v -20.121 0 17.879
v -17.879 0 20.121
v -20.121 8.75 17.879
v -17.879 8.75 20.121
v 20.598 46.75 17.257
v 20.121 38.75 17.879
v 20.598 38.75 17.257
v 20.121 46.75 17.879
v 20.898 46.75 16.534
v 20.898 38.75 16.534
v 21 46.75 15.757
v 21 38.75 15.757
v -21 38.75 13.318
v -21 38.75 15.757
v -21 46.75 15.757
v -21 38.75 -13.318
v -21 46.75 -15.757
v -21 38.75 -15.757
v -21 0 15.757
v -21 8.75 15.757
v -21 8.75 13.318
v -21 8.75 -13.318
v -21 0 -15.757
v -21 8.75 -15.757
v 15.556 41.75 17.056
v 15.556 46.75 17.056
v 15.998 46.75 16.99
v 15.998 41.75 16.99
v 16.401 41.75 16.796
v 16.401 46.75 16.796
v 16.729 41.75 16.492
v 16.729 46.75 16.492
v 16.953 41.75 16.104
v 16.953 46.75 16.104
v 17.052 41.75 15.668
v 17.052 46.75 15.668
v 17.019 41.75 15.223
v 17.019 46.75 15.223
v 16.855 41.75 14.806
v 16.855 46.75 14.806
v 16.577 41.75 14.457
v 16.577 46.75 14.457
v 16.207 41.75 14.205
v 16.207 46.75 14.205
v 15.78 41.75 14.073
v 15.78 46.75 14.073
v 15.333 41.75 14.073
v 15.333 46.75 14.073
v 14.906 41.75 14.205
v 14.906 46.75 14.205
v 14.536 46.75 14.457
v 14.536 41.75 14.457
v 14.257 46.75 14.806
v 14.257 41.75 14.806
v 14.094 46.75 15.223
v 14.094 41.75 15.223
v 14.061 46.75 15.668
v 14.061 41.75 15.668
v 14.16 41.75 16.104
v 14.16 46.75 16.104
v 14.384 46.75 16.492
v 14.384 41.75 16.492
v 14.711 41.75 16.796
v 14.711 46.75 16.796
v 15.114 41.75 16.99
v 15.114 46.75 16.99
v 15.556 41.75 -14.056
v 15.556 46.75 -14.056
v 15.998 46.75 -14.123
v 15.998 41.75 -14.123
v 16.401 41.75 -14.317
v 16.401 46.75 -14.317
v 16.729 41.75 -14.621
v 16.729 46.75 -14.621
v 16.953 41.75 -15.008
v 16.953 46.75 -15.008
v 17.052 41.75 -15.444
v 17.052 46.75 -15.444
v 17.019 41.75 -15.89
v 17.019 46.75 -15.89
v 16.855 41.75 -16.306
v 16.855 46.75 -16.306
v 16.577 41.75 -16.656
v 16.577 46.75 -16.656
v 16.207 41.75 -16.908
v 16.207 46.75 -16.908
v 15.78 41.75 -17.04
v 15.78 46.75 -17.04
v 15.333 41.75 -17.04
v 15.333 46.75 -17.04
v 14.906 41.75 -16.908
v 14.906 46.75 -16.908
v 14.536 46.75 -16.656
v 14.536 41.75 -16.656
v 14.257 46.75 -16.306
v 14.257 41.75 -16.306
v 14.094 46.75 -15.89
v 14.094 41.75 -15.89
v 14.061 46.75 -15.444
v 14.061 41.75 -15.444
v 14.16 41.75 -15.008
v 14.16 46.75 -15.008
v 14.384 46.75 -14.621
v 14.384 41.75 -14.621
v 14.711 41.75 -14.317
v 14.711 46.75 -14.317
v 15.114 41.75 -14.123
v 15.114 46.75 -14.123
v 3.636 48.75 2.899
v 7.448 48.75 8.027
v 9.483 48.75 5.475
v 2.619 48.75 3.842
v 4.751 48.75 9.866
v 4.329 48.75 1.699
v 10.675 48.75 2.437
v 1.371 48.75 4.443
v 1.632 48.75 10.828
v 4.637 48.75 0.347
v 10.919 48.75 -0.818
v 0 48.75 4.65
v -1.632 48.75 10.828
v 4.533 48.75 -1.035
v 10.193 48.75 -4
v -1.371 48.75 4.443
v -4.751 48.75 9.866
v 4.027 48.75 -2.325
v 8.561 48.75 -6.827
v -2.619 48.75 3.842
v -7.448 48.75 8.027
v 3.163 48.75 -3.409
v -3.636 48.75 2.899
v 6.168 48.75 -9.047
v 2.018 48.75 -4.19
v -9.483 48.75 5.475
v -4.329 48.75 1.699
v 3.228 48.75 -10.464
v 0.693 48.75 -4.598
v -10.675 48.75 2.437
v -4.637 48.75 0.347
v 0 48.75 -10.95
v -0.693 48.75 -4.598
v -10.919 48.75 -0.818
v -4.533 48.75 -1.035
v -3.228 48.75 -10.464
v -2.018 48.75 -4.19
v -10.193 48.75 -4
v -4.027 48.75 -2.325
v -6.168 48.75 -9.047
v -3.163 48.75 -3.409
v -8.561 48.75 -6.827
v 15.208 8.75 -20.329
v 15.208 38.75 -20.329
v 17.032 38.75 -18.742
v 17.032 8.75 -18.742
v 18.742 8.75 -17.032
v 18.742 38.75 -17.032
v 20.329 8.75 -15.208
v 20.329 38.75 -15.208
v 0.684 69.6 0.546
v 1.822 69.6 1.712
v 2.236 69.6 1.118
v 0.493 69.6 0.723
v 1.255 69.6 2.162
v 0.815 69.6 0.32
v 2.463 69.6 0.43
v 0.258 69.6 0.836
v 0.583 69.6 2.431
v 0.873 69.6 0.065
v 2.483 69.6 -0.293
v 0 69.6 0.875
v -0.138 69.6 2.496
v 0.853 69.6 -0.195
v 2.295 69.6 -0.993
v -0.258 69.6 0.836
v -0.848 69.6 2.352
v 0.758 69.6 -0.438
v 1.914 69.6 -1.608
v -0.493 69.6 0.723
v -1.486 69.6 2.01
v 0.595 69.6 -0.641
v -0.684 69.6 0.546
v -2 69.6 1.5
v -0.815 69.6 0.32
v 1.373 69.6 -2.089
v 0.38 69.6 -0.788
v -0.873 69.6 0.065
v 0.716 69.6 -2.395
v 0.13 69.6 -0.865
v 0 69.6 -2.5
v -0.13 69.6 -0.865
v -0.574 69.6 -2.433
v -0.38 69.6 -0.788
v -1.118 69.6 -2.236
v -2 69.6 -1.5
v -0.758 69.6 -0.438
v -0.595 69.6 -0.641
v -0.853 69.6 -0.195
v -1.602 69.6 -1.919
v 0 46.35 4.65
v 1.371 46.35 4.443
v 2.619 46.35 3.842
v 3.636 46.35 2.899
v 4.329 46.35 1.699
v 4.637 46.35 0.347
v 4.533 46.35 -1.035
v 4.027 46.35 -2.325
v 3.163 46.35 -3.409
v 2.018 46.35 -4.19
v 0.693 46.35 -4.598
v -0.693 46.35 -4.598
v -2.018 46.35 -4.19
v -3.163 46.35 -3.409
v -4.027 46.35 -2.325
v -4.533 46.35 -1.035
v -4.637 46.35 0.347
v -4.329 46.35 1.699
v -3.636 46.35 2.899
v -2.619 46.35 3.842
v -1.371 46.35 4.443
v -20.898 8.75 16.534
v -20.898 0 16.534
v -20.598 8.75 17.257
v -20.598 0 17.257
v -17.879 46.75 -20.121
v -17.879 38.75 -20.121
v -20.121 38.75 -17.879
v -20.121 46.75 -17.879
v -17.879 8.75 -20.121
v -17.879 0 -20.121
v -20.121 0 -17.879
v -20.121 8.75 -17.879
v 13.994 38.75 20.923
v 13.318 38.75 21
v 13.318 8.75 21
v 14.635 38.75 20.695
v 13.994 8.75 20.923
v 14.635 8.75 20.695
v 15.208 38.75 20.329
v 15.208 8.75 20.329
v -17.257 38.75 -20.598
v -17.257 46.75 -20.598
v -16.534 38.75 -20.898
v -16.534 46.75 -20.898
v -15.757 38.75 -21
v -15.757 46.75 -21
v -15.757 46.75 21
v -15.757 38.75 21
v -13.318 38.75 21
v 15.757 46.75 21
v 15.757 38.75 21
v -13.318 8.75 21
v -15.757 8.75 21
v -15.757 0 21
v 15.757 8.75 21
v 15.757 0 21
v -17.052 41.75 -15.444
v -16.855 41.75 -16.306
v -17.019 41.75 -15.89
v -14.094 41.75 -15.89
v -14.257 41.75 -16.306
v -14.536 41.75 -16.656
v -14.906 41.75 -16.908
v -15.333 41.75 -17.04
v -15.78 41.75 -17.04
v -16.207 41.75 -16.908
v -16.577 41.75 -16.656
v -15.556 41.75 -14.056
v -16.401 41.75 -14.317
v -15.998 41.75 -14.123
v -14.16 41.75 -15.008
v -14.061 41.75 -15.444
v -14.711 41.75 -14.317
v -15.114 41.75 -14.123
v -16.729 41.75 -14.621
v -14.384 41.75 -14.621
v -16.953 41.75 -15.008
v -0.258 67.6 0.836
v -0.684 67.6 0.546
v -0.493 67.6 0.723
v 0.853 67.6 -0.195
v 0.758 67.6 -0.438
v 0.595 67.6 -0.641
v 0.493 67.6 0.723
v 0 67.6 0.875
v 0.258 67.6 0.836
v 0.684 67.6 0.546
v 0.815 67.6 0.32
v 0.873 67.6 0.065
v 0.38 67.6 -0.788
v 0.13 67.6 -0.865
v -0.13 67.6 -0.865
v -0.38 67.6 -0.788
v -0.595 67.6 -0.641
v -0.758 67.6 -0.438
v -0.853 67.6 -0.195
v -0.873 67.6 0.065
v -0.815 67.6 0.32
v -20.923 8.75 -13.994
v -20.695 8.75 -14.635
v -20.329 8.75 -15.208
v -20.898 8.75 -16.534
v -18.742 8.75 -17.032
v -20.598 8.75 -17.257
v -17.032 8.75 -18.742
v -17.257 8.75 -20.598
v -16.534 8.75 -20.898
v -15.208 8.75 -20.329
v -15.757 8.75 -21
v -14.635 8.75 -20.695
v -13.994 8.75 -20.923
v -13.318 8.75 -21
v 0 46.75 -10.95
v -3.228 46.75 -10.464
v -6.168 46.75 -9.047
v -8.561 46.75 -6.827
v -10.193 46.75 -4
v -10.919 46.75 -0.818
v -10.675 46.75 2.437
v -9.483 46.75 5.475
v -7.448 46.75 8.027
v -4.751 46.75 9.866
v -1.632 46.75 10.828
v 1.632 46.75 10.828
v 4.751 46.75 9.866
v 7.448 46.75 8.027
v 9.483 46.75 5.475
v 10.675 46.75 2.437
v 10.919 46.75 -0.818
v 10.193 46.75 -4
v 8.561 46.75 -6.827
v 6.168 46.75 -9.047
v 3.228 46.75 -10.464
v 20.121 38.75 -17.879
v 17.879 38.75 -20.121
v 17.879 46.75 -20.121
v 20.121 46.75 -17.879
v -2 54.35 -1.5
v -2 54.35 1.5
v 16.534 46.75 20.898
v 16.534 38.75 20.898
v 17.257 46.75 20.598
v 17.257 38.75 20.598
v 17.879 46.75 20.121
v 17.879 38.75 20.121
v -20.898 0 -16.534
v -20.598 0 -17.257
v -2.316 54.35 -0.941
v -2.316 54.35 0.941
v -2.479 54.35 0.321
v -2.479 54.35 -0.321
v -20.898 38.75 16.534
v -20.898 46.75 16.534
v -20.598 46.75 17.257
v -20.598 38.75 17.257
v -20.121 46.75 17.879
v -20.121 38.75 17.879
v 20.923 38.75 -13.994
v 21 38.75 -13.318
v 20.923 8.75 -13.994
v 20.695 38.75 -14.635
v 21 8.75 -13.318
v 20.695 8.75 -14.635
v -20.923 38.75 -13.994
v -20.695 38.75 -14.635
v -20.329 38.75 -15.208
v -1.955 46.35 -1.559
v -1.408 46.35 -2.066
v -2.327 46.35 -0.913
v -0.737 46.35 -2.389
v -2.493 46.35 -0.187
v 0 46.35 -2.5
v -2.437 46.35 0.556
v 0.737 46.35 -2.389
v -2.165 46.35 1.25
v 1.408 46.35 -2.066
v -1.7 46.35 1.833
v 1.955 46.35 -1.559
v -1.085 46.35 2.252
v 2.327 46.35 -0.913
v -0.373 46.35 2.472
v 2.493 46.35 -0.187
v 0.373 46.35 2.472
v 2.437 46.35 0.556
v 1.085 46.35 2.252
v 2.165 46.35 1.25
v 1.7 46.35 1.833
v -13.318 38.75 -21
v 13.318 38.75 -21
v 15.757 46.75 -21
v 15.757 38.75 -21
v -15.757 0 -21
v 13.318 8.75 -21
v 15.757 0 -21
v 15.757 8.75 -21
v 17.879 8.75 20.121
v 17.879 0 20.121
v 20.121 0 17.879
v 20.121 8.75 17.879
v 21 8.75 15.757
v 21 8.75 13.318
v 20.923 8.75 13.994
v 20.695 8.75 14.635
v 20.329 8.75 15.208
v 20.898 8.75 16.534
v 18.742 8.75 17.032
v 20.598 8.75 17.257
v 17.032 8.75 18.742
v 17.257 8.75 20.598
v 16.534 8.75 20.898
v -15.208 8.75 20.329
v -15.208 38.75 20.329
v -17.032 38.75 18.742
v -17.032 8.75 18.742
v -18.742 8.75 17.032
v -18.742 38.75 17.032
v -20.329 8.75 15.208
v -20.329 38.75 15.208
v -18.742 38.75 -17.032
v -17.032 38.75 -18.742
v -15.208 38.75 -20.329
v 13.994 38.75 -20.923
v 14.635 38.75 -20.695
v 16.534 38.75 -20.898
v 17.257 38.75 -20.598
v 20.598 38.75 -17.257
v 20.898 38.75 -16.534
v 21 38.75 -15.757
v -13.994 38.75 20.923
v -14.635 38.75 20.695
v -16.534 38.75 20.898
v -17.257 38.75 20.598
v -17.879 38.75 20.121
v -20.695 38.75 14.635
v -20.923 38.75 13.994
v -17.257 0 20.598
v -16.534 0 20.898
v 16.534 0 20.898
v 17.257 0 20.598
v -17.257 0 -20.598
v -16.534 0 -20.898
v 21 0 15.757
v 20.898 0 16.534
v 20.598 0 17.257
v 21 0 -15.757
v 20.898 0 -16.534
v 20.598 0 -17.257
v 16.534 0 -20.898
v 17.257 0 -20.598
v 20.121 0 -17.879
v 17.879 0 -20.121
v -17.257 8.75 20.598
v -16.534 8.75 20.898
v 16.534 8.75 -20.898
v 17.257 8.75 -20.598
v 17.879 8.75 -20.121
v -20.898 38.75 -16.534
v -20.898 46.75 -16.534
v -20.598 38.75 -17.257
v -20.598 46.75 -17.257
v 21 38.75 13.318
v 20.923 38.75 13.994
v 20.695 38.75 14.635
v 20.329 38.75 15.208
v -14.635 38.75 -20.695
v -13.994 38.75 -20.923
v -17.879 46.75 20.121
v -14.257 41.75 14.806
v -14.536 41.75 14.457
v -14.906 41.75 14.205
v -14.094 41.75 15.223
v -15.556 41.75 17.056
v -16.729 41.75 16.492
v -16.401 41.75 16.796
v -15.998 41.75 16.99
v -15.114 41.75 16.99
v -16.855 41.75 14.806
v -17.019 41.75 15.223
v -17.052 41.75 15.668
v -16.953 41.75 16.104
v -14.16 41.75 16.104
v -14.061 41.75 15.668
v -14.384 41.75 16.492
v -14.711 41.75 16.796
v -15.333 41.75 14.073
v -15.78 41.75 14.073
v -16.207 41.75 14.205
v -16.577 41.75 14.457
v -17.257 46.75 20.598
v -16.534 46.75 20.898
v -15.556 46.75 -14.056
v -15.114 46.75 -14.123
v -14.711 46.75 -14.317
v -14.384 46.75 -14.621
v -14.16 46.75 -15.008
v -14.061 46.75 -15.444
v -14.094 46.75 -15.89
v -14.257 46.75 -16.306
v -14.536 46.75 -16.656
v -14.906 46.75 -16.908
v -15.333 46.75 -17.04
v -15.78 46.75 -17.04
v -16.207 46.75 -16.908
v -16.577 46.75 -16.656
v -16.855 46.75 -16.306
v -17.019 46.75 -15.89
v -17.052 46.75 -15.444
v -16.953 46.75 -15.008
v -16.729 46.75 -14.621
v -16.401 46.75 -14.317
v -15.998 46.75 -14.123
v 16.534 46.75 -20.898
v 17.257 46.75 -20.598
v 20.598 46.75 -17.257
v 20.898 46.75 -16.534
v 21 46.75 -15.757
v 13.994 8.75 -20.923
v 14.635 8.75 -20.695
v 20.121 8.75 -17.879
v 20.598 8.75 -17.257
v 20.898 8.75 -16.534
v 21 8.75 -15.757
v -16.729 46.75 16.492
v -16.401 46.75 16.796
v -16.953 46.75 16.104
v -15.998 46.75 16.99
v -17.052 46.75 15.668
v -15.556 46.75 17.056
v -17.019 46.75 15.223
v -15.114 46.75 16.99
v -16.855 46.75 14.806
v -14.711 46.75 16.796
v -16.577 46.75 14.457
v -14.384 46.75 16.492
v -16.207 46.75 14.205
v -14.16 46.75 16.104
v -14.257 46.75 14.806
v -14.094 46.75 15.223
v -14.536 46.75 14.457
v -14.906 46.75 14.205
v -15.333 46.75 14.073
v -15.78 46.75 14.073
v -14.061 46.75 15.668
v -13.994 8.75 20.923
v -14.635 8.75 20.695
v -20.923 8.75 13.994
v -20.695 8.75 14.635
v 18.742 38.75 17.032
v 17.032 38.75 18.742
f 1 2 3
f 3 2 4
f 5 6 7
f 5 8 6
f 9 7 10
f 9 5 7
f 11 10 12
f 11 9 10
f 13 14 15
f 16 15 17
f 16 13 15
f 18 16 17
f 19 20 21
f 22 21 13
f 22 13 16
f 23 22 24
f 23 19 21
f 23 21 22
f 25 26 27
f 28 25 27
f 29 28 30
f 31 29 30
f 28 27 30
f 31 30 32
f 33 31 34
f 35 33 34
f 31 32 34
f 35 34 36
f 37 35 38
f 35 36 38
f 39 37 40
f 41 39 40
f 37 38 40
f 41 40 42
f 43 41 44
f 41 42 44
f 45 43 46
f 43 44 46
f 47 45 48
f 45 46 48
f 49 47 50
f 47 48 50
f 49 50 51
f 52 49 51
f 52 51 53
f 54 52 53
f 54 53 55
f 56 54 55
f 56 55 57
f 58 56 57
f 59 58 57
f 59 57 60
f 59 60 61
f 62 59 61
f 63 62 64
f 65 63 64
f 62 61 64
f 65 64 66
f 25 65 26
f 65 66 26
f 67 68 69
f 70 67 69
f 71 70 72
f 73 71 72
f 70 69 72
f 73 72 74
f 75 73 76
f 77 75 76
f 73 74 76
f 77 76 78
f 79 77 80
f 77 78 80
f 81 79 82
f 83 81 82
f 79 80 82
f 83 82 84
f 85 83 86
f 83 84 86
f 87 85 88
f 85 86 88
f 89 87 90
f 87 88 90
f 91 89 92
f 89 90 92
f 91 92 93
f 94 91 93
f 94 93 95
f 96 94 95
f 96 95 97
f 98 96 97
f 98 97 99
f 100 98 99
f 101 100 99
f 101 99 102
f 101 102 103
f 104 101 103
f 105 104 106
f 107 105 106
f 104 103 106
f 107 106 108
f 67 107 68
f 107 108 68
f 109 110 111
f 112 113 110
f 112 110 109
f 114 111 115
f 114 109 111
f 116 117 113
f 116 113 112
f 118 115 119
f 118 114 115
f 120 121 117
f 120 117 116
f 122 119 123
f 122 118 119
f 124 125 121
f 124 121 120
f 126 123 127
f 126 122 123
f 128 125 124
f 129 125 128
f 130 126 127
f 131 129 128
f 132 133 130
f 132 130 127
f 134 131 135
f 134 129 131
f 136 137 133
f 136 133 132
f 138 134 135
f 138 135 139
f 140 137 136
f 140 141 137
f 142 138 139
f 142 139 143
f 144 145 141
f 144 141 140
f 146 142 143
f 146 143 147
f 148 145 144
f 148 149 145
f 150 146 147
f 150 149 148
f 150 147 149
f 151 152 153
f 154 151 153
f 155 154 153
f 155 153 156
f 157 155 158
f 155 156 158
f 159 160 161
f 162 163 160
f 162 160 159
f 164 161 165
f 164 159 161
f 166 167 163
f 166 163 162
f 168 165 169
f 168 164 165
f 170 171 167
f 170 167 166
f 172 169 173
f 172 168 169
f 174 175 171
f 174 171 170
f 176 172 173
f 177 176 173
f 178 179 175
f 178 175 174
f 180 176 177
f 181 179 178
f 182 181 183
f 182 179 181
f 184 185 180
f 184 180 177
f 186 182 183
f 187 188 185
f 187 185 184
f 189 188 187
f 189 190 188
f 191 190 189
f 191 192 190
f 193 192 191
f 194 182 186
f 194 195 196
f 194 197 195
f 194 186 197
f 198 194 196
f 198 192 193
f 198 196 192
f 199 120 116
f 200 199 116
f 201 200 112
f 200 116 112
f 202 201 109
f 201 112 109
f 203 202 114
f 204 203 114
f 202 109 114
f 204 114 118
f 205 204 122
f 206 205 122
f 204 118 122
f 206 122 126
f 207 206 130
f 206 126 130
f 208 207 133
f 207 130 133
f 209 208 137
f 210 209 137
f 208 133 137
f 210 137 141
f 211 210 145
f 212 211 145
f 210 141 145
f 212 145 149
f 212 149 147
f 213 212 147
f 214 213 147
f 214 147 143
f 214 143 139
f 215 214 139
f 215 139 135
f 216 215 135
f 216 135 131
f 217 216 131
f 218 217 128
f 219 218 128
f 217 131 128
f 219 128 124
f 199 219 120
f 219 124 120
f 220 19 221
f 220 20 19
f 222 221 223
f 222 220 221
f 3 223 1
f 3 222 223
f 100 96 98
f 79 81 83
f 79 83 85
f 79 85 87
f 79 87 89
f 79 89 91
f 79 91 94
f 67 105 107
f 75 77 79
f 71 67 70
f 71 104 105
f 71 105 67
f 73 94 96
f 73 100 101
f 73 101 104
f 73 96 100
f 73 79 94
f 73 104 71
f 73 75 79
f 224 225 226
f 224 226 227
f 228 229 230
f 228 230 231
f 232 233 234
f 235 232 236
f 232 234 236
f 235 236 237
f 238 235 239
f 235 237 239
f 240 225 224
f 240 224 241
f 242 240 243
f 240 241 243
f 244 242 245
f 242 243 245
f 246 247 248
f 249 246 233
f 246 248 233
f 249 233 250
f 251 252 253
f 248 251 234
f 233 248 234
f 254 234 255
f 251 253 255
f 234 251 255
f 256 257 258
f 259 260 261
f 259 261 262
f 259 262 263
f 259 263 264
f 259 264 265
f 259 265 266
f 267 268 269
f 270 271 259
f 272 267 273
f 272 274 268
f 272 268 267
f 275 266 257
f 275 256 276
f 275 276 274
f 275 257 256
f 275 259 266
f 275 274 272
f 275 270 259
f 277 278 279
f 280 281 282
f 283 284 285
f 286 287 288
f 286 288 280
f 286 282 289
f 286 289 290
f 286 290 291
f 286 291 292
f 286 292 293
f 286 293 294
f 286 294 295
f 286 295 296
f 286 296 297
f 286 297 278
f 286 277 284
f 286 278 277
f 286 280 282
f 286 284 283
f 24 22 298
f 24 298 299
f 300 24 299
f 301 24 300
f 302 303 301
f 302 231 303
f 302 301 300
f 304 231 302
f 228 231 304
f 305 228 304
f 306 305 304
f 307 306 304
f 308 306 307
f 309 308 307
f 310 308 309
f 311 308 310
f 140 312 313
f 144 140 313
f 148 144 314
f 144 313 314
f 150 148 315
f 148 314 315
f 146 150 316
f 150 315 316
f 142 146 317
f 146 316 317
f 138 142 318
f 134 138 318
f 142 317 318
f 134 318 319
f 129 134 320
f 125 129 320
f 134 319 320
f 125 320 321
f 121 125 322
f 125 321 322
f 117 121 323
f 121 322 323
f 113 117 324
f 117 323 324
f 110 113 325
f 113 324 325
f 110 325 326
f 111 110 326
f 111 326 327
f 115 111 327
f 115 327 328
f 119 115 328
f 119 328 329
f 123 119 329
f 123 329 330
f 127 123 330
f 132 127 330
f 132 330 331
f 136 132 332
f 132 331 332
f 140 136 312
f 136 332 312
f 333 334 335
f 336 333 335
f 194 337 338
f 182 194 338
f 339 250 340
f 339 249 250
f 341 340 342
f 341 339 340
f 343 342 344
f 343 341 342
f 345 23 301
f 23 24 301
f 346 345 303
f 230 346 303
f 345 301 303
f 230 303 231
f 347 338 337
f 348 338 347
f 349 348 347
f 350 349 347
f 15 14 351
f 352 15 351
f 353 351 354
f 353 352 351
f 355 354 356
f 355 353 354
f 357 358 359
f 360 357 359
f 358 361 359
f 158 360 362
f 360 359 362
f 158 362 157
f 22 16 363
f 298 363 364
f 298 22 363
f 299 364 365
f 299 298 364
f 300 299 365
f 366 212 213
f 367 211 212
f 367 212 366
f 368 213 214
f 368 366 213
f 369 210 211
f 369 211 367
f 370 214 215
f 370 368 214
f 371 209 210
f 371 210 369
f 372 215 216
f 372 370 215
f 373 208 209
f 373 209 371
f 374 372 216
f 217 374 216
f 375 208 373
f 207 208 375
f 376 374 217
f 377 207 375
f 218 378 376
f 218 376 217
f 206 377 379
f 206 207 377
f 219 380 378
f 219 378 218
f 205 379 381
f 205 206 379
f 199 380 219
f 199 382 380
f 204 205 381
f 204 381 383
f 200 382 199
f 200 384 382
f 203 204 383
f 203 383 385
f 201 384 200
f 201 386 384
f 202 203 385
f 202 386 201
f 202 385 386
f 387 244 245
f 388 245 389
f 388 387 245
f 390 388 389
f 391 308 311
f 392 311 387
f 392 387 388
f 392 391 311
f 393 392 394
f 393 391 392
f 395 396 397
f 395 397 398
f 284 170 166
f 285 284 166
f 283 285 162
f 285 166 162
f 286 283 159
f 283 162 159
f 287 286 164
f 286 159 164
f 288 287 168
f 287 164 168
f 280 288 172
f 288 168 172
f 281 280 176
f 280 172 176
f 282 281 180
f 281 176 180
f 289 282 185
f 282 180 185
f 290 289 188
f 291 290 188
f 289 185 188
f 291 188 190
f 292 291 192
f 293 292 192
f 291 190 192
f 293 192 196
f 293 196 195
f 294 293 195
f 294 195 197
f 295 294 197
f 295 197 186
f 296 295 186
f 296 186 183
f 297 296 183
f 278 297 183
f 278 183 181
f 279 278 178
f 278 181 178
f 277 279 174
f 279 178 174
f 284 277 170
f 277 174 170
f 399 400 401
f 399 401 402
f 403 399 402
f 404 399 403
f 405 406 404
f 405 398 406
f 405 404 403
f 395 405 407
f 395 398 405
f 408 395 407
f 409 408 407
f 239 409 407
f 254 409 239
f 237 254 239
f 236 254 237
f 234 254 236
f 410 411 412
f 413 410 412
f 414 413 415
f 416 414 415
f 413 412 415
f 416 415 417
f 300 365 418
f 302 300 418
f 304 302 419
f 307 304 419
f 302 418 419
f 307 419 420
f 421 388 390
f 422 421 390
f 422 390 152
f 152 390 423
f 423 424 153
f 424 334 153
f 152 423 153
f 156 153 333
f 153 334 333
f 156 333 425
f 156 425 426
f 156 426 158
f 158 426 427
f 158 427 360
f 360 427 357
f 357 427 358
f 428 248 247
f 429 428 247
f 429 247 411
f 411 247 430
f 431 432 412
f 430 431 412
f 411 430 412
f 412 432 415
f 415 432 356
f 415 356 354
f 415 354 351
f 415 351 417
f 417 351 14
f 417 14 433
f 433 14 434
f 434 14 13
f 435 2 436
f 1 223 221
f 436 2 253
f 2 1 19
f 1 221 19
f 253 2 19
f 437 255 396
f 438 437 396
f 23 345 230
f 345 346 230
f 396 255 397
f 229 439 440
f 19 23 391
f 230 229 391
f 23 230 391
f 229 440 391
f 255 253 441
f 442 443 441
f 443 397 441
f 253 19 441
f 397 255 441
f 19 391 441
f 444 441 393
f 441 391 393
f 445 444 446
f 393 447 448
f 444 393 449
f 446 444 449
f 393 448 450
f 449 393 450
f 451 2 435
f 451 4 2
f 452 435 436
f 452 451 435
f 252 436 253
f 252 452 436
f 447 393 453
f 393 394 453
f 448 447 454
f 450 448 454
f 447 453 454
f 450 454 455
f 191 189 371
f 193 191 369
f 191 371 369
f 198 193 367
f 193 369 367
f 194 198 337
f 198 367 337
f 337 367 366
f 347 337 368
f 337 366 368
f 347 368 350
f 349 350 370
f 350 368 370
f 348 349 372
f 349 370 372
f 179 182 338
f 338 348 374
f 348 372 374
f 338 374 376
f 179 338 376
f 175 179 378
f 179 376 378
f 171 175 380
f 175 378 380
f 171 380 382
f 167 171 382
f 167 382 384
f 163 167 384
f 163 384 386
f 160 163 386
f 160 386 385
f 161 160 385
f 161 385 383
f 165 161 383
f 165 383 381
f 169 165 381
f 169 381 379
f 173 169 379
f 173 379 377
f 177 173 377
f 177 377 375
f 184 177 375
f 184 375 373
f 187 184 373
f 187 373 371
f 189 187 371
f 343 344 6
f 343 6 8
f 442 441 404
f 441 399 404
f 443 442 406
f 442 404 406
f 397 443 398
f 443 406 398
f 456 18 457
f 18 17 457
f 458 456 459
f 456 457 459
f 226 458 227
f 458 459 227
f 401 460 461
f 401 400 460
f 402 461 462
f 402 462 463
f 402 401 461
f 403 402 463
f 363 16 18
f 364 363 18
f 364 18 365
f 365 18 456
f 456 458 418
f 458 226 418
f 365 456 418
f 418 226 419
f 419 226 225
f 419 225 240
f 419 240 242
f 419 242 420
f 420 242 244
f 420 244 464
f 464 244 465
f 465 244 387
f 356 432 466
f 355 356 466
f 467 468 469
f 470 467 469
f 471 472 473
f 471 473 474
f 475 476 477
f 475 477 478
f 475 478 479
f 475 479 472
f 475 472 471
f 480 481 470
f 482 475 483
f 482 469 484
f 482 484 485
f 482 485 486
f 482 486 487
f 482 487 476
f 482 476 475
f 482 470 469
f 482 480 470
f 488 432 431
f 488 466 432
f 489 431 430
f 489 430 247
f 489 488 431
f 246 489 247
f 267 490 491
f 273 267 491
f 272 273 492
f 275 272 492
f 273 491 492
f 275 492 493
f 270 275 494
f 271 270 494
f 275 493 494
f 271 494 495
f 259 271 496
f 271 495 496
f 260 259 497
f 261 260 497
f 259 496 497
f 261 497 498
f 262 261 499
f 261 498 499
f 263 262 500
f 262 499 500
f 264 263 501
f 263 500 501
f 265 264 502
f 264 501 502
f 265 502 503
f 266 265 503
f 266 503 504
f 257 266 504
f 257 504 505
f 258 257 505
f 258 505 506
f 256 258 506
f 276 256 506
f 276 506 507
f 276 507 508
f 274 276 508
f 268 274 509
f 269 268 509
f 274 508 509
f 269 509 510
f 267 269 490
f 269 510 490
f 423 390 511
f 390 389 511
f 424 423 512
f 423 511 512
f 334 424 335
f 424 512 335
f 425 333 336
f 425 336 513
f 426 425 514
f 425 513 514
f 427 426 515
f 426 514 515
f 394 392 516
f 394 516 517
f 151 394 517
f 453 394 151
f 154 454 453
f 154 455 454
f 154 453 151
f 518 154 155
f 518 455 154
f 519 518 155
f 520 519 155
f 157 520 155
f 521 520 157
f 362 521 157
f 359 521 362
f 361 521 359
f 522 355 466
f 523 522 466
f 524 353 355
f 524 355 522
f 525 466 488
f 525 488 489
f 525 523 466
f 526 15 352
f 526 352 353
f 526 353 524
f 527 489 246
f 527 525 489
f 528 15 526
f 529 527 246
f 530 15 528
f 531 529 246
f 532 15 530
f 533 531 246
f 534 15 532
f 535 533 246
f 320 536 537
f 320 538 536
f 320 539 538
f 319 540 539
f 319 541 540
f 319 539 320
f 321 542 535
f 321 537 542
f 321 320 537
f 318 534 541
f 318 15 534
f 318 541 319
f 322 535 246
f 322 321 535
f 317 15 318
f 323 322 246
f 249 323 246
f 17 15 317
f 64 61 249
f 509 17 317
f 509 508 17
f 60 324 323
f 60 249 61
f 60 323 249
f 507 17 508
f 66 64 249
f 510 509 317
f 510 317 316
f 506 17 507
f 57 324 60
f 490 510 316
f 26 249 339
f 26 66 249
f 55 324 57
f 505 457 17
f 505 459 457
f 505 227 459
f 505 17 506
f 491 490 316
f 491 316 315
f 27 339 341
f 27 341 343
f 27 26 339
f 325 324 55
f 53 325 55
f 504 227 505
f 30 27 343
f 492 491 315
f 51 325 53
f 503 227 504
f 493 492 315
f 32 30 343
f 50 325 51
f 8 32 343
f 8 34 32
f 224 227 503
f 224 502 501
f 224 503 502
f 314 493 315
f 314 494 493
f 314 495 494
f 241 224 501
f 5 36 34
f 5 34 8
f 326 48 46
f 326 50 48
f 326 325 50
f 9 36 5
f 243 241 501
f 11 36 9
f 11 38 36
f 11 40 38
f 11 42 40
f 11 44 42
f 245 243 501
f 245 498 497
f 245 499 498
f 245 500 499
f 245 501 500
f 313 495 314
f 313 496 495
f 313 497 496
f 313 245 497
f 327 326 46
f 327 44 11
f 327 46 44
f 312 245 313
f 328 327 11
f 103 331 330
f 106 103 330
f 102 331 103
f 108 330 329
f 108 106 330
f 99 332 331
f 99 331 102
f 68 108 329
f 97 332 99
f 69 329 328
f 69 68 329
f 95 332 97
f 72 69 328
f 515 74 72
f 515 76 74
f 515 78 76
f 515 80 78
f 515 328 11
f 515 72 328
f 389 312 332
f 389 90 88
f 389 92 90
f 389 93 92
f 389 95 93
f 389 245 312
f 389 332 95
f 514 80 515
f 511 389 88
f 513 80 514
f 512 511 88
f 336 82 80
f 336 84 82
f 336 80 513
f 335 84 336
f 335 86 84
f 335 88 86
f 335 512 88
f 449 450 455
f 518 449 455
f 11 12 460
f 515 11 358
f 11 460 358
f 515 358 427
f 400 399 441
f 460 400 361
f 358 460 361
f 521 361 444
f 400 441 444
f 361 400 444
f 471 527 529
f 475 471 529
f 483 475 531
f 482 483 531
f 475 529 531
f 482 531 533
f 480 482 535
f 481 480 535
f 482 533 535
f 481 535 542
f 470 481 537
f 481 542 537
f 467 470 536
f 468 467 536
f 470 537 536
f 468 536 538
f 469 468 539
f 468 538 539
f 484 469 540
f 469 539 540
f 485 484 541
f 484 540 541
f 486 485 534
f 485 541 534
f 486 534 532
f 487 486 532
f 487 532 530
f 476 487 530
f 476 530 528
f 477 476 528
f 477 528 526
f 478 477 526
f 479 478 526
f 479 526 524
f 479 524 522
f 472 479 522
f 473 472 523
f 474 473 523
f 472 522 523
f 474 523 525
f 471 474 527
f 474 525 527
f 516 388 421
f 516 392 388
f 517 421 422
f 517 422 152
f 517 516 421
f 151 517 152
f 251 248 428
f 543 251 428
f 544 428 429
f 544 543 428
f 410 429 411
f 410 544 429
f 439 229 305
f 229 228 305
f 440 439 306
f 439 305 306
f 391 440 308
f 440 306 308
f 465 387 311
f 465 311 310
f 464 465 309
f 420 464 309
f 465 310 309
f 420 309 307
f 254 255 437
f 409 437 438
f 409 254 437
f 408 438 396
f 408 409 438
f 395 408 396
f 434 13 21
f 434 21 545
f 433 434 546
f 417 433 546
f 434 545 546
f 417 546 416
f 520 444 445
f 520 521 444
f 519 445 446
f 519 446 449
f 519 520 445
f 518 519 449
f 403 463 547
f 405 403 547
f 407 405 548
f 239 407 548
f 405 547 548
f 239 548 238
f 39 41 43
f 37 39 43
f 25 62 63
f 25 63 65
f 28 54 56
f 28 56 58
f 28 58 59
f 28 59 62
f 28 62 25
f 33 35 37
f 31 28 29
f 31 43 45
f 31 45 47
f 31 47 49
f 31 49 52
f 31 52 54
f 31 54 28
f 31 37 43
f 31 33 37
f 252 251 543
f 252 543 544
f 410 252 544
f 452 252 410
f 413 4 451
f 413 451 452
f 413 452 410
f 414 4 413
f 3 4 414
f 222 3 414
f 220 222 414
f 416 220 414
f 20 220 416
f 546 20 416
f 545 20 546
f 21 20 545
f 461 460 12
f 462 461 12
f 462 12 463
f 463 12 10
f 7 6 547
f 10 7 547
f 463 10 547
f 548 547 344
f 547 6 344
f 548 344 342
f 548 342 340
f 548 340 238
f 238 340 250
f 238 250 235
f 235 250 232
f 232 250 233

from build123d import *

# Parameters (mm, degrees)
SKETCH1_W             = 42
SKETCH1_H             = 42
SKETCH1_R             = 3.407851421
BOSS_EXTRUDE1_DEPTH   = 46.75
SKETCH2_R             = 10.95
BOSS_EXTRUDE2_DEPTH   = 2
CUT_EXTRUDE1_START    = -8
CUT_EXTRUDE1_DEPTH    = 30
CIRPATTERN1_COUNT     = 4
FILLET1_R             = 3
CHAMFER1_SIZE         = 4
FILLET2_R             = 3
SKETCH4_R             = 4.65
CUT_EXTRUDE2_DEPTH    = 2.4
DELETEFACE1_OUTLINE_R = 3.407851421
DELETEFACE1_DEPTH     = 46.35
SKETCH5_R             = 2.5
BOSS_EXTRUDE3_DEPTH   = 23.25
CUT_EXTRUDE3_DEPTH    = 15.25
SKETCH7_R             = 0.875
CUT_EXTRUDE4_DEPTH    = 2
SKETCH8_R             = 1.5
CUT_EXTRUDE5_DEPTH    = 5


# Read off the part's stored shape, not the designer's step: DeleteFace1
with BuildPart() as part:
    # Sketch1 → Boss-Extrude1 (new body)
    with BuildSketch(Plane(origin=(0, 0, 0), x_dir=(1, 0, 0), z_dir=(0, 1, 0))):
        Rectangle(SKETCH1_W, SKETCH1_H)
        with Locations(Location((0, 0, 0), (0, 0, 270))):
            Circle(SKETCH1_R, mode=Mode.SUBTRACT)
    extrude(amount=BOSS_EXTRUDE1_DEPTH)

    # Sketch2 → Boss-Extrude2 (add)
    with BuildSketch(Plane(origin=(0, 46.75, 0), x_dir=(1, 0, 0), z_dir=(0, 1, 0))):
        with Locations(Location((0, 0, 0), (0, 0, 90))):
            Circle(SKETCH2_R)
    extrude(amount=BOSS_EXTRUDE2_DEPTH)

    # Sketch3 → Cut-Extrude1 (cut)
    with BuildSketch(Plane(origin=(0, 46.75, 0), x_dir=(1, 0, 0), z_dir=(0, 1, 0)).offset(CUT_EXTRUDE1_START)):
        with BuildLine():
            Line((-14.355339059, 21), (-21, 21))
            Line((-21, 21), (-21, 14.355339059))
            ThreePointArc((-21, 14.355339059), (-17.901682199, 17.901682199), (-14.355339059, 21))
        make_face()
    cut_extrude1 = extrude(amount=-CUT_EXTRUDE1_DEPTH, mode=Mode.SUBTRACT)

    # CirPattern1: Cut-Extrude1 ×4 about axis
    cirpattern1_axis = Axis((0, 0, 0), (0, 1, 0))
    for i in range(1, CIRPATTERN1_COUNT):
        add(cut_extrude1.rotate(cirpattern1_axis, i * 360 / CIRPATTERN1_COUNT), mode=Mode.SUBTRACT)

    # Fillet1
    fillet1_edges = [part.edges().sort_by_distance(p)[0] for p in [
        (-14.355339059, 23.75, -21),
        (-21, 23.75, -14.355339059),
        (21, 23.75, -14.355339059),
        (14.355339059, 23.75, -21),
        (14.355339059, 23.75, 21),
        (21, 23.75, 14.355339059),
        (-21, 23.75, 14.355339059),
        (-14.355339059, 23.75, 21),
    ]]
    fillet(fillet1_edges, radius=FILLET1_R)

    # Chamfer1
    chamfer1_edges = [part.edges().sort_by_distance(p)[0] for p in [
        (-21, 4.375, -21),
        (21, 4.375, -21),
        (21, 4.375, 21),
        (-21, 4.375, 21),
        (-21, 42.75, -21),
        (-21, 42.75, 21),
        (21, 42.75, 21),
        (21, 42.75, -21),
    ]]
    chamfer(chamfer1_edges, length=CHAMFER1_SIZE)

    # Fillet2
    fillet2_edges = [part.edges().sort_by_distance(p)[0] for p in [
        (17, 42.75, 21),
        (17, 4.375, 21),
        (-17, 4.375, 21),
        (-17, 42.75, 21),
        (-21, 42.75, -17),
        (-21, 4.375, -17),
        (-21, 4.375, 17),
        (-21, 42.75, 17),
        (17, 42.75, -21),
        (17, 4.375, -21),
        (-17, 42.75, -21),
        (-17, 4.375, -21),
        (21, 42.75, -17),
        (21, 4.375, -17),
        (21, 42.75, 17),
        (21, 4.375, 17),
    ]]
    fillet(fillet2_edges, radius=FILLET2_R)

    # Sketch4 → Cut-Extrude2 (cut)
    with BuildSketch(Plane(origin=(0, 48.75, 0), x_dir=(1, 0, 0), z_dir=(0, 1, 0))):
        with Locations(Location((0, 0, 0), (0, 0, 270))):
            Circle(SKETCH4_R)
    extrude(amount=-CUT_EXTRUDE2_DEPTH, mode=Mode.SUBTRACT)

    # DeleteFace1 outline → DeleteFace1 (add)
    with BuildSketch(Plane(origin=(0, 0, 0), x_dir=(1, 0, 0), z_dir=(0, 1, 0))):
        Circle(DELETEFACE1_OUTLINE_R)
    extrude(amount=DELETEFACE1_DEPTH)

    # Sketch5 → Boss-Extrude3 (add)
    with BuildSketch(Plane(origin=(0, 46.35, 0), x_dir=(1, 0, 0), z_dir=(0, 1, 0))):
        with Locations(Location((0, 0, 0), (0, 0, 90))):
            Circle(SKETCH5_R)
    extrude(amount=BOSS_EXTRUDE3_DEPTH)

    # Sketch6 → Cut-Extrude3 (cut)
    with BuildSketch(Plane(origin=(0, 69.6, 0), x_dir=(1, 0, 0), z_dir=(0, 1, 0))):
        with BuildLine():
            Line((-2, 1.5), (-2, -1.5))
            ThreePointArc((-2, -1.5), (-10.750577437, 0), (-2, 1.5))
        make_face()
    extrude(amount=-CUT_EXTRUDE3_DEPTH, mode=Mode.SUBTRACT)

    # Sketch7 → Cut-Extrude4 (cut)
    with BuildSketch(Plane(origin=(0, 69.6, 0), x_dir=(1, 0, 0), z_dir=(0, 1, 0))):
        with Locations(Location((0, 0, 0), (0, 0, 270))):
            Circle(SKETCH7_R)
    extrude(amount=-CUT_EXTRUDE4_DEPTH, mode=Mode.SUBTRACT)

    # Sketch8 → Cut-Extrude5 (cut)
    with BuildSketch(Plane(origin=(0, 46.75, 0), x_dir=(1, 0, 0), z_dir=(0, 1, 0))):
        with Locations(Location((-15.556349186, 15.556349186, 0), (0, 0, 270))):
            Circle(SKETCH8_R)
        with Locations(Location((15.556349186, 15.556349186, 0), (0, 0, 270))):
            Circle(SKETCH8_R)
        with Locations(Location((15.556349186, -15.556349186, 0), (0, 0, 270))):
            Circle(SKETCH8_R)
        with Locations(Location((-15.556349186, -15.556349186, 0), (0, 0, 270))):
            Circle(SKETCH8_R)
    extrude(amount=-CUT_EXTRUDE5_DEPTH, mode=Mode.SUBTRACT)


solid = part.part
